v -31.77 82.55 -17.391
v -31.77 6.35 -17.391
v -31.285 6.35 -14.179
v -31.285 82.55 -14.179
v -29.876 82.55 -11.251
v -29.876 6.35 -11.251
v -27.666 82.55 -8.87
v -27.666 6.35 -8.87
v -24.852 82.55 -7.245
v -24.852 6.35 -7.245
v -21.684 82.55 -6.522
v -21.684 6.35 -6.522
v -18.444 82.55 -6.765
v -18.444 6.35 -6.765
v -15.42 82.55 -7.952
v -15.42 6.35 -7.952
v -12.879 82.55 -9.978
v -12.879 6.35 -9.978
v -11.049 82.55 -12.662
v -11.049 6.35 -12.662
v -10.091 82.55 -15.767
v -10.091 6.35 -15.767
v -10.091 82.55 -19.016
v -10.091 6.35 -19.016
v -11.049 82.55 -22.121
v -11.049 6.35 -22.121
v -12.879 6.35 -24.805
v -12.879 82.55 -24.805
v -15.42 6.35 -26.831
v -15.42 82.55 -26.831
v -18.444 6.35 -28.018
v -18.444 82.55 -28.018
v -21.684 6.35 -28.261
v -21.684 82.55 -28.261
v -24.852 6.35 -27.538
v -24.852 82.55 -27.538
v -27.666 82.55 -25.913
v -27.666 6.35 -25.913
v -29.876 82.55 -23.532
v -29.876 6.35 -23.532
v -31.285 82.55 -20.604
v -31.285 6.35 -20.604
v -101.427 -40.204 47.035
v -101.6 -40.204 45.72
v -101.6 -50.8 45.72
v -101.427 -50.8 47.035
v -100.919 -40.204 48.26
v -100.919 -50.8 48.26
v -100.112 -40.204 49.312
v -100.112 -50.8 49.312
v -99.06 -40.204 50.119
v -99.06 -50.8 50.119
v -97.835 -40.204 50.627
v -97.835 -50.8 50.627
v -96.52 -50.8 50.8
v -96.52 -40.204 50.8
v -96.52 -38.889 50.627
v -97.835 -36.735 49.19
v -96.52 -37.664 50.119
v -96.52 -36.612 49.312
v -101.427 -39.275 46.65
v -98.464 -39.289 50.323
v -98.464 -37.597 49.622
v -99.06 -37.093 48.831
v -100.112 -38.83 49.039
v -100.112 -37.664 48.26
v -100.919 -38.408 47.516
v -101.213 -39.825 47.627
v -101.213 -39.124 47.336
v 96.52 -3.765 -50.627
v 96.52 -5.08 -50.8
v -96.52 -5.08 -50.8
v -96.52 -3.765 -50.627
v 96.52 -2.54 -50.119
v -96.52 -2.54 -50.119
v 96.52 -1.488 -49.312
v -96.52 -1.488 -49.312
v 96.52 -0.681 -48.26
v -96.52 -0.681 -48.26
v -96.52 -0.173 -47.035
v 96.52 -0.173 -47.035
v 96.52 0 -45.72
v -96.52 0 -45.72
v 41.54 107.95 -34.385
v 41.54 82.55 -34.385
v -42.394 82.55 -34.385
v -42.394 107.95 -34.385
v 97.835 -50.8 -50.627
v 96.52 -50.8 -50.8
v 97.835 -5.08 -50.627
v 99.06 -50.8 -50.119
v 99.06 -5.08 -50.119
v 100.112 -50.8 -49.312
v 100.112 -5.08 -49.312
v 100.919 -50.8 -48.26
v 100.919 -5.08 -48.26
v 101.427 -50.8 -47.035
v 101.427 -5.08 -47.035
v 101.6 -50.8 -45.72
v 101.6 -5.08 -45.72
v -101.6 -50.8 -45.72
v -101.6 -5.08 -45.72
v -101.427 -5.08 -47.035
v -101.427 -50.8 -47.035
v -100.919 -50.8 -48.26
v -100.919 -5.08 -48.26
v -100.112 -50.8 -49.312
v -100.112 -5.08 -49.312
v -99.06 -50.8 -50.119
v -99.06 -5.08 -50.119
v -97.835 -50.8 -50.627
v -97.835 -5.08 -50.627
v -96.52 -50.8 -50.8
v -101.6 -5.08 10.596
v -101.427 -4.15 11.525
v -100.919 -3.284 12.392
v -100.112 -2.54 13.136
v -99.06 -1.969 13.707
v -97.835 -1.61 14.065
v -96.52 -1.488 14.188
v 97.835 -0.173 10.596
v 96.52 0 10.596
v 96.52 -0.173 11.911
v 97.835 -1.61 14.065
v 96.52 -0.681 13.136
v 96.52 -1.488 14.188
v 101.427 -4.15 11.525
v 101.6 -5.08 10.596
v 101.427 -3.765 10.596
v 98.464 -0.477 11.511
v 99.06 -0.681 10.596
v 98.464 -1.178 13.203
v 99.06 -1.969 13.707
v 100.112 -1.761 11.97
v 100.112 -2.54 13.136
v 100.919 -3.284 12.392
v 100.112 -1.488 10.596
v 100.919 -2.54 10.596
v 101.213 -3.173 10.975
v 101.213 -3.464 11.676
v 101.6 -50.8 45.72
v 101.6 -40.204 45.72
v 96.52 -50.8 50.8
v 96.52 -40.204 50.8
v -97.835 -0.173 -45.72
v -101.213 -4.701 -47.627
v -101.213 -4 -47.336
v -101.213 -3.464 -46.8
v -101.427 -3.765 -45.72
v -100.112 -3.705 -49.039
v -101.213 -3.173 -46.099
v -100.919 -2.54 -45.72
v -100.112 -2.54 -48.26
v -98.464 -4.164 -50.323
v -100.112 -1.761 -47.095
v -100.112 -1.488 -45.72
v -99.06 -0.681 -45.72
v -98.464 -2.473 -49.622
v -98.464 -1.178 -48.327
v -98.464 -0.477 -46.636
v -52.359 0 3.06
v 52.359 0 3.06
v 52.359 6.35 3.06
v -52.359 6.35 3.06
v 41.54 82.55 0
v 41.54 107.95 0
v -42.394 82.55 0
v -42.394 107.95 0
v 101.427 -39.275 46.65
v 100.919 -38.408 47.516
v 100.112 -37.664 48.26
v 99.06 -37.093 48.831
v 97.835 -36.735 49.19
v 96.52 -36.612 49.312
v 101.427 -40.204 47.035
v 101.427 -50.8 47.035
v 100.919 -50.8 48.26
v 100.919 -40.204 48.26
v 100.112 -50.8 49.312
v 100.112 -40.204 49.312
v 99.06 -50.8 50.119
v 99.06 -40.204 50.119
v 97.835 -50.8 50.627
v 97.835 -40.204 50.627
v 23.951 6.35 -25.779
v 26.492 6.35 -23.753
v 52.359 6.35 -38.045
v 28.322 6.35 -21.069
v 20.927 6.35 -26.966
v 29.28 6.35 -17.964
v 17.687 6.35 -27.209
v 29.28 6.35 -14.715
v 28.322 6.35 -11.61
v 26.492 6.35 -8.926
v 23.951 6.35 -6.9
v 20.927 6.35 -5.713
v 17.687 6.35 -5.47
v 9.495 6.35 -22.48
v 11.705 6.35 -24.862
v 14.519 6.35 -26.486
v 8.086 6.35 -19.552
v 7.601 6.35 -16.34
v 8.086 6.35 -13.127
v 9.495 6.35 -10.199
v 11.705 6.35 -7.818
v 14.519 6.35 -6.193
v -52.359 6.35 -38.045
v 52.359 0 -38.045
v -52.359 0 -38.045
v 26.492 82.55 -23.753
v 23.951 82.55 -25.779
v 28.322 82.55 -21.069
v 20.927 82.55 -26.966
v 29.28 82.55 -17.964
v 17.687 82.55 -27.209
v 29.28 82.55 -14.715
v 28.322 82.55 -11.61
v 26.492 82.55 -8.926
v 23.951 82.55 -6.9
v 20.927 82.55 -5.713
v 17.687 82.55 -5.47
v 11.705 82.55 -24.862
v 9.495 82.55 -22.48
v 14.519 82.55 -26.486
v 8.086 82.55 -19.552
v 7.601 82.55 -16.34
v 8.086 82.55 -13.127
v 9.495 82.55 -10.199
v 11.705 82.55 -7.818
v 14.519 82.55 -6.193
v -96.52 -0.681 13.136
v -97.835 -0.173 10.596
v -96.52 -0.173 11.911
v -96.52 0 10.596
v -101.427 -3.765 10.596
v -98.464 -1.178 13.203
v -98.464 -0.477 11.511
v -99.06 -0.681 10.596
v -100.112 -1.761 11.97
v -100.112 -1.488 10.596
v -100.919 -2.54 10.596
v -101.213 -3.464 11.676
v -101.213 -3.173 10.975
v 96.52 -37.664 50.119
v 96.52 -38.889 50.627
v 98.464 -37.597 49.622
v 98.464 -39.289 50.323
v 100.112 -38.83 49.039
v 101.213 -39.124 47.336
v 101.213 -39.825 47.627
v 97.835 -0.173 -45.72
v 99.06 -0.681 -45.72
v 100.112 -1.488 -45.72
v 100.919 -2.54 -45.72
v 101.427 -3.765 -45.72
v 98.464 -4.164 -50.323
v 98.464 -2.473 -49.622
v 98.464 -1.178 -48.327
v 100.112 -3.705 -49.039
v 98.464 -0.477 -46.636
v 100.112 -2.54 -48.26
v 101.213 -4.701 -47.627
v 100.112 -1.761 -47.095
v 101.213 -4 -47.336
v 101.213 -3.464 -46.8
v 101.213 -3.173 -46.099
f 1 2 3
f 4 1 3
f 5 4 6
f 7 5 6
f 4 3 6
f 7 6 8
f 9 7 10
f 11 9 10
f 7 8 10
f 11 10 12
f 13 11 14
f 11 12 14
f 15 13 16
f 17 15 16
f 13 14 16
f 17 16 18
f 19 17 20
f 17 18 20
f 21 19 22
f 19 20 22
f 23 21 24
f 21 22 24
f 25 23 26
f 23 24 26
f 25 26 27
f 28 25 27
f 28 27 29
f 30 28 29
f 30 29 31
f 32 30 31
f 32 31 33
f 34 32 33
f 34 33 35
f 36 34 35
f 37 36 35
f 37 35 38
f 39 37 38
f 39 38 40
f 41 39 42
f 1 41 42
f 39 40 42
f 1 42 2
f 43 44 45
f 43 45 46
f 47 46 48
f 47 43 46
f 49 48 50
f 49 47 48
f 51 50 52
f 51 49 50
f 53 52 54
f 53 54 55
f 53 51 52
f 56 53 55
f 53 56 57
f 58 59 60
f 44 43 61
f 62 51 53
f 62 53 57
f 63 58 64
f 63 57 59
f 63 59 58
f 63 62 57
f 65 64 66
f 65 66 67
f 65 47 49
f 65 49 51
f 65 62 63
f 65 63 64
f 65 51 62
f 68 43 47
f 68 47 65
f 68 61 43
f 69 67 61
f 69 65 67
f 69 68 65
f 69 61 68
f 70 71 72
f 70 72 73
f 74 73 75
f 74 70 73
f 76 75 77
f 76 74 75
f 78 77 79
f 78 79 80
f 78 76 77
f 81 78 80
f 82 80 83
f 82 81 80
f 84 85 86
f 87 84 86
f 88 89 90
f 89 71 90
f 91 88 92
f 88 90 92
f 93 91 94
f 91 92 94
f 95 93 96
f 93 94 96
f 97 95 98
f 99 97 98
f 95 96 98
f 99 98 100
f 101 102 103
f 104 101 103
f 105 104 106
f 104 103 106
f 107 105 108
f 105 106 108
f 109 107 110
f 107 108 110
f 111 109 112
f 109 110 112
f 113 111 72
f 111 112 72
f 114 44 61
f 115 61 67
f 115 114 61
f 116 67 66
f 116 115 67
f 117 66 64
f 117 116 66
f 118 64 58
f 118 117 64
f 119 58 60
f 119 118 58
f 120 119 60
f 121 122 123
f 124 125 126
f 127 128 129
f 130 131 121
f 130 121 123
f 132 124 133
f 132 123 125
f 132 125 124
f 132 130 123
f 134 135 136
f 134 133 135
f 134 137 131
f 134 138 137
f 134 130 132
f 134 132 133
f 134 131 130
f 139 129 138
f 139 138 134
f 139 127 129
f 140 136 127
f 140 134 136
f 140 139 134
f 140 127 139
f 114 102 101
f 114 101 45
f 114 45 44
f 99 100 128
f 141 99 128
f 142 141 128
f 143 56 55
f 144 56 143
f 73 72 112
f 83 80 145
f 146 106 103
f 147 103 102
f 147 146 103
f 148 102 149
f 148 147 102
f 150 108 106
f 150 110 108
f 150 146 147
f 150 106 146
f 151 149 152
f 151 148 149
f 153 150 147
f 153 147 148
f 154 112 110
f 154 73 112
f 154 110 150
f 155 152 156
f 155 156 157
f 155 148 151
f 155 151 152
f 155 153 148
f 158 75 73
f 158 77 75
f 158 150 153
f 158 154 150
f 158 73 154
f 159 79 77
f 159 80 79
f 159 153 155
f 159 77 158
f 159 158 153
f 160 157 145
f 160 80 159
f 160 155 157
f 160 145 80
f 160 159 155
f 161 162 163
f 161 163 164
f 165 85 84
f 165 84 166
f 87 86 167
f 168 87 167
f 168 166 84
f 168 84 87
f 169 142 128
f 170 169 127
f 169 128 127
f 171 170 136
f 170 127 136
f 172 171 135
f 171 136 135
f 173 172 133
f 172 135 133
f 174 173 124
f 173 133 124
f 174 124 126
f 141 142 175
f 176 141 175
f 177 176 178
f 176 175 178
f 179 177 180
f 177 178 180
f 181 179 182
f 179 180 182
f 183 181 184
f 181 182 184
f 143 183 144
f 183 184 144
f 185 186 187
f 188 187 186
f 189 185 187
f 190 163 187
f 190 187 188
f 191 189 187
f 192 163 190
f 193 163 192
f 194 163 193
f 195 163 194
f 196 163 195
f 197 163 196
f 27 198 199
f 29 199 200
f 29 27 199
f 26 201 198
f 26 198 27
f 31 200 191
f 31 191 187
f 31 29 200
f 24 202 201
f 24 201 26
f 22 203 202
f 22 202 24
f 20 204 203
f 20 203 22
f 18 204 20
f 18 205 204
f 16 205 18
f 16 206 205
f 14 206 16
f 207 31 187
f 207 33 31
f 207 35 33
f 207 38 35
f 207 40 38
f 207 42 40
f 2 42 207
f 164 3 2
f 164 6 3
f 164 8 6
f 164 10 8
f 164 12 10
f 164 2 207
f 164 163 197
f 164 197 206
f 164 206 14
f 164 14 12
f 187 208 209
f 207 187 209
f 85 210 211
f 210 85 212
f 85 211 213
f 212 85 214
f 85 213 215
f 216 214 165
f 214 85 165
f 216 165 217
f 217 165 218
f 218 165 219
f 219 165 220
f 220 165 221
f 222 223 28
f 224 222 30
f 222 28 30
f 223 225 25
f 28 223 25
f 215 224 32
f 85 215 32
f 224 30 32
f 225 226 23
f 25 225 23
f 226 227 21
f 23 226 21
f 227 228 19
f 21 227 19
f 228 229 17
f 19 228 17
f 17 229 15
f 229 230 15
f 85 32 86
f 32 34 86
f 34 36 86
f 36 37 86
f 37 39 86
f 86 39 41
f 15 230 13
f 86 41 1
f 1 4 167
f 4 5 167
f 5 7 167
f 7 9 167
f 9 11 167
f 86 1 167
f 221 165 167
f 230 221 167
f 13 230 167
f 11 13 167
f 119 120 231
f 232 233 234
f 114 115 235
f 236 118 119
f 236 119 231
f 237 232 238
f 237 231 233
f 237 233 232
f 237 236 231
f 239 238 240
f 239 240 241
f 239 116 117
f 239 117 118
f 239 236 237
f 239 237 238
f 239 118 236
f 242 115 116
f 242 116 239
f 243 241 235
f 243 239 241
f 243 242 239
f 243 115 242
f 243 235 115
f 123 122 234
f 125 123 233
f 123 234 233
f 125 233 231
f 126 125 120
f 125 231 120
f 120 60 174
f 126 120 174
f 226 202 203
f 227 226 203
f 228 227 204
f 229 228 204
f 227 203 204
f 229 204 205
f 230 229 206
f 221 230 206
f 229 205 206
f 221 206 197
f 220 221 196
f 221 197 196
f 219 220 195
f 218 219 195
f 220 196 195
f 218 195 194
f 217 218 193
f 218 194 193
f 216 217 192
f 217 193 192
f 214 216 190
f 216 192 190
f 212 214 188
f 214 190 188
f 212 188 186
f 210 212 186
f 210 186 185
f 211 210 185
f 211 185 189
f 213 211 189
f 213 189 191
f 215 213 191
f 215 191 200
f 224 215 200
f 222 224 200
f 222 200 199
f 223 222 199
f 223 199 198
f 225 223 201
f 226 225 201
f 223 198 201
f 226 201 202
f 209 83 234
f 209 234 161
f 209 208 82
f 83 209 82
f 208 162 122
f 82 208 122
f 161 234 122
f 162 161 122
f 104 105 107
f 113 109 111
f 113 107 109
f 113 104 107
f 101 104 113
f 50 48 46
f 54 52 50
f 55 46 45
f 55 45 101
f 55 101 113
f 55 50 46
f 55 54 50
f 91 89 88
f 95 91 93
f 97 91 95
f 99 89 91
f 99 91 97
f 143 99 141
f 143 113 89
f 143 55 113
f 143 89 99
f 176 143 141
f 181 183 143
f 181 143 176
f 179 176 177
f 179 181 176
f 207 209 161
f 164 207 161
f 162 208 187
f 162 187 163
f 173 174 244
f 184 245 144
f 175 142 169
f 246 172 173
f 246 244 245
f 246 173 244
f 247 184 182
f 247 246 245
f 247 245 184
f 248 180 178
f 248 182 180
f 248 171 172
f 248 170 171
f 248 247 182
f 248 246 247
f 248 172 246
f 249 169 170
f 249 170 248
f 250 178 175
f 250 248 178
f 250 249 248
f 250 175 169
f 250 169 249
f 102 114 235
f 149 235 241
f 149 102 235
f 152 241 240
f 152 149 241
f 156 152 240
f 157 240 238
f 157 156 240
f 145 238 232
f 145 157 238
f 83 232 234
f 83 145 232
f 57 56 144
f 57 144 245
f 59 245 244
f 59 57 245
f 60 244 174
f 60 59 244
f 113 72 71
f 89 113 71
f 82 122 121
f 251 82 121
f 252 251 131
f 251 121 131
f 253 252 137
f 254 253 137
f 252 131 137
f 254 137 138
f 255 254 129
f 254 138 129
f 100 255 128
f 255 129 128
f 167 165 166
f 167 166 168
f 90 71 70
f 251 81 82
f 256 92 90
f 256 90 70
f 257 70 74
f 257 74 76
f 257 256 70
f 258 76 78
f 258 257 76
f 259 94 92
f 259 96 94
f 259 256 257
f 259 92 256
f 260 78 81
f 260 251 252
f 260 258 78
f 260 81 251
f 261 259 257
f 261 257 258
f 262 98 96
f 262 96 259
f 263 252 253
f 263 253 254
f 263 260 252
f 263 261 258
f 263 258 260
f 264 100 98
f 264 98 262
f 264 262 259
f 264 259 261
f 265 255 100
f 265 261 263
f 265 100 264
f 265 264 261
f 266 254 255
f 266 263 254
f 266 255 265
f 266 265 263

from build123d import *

# Parameters (mm, degrees)
F0_W         = 203.2
F0_H         = 101.6
F1_DEPTH     = 50.8
F2_R         = 5.08
F3_SIZE      = 38.1
F4_T1_DEPTH  = 71.12
F4_T3_DEPTH  = 58.42
F4_T6_ANGLE  = 90
F5_R         = 5.08
F6_T1_DEPTH  = 64.4773318296
F6_T3_DEPTH  = 193.04
F6_T8_DEPTH  = 5.08
F6_T14_DEPTH = 5.08
F7_T1_DEPTH  = 193.04
F7_T3_DEPTH  = 23.2957951031
F7_T8_DEPTH  = 5.08
F7_T14_DEPTH = 5.08
F8_W         = 104.7176718712
F8_H         = 41.105248034
F9_DEPTH     = 6.35
F10_R        = 10.900008085
F11_DEPTH    = 76.2
F12_W        = 83.9344151318
F12_H        = 34.3853458762
F13_DEPTH    = 25.4


# Not quite as in the source:
# - a fillet or chamfer that OpenCascade refuses, or shapes differently, is made with other operations: its cross-section is extruded or revolved along the edge and cut away or added


with BuildPart() as f1:
    # F0 (on Front) → F1 (new body)
    with BuildSketch(Plane.XZ):
        Rectangle(F0_W, F0_H)
    extrude(amount=F1_DEPTH)

    # F2
    f2_edges = [f1.edges().sort_by_distance(p)[0] for p in [
        (0, 0, -50.8),
    ]]
    fillet(f2_edges, radius=F2_R)

    # F3
    f3_edges = [f1.edges().sort_by_distance(p)[0] for p in [
        (0, 0, 50.8),
    ]]
    chamfer(f3_edges, length=F3_SIZE)

    # F4: fillet of radius 5.08 on 1 edges, made by hand

    # F4_s2 → F4_t1 (cut)
    with BuildSketch(Plane.XY.offset(-45.72)):
        with BuildLine():
            ThreePointArc((-101.6, -5.08), (-100.1121024484, -1.4878975516), (-96.52, 0))
            Line((-96.52, 0), (-101.6, 0))
            Line((-101.6, 0), (-101.6, -5.08))
        make_face()
    extrude(amount=F4_T1_DEPTH, mode=Mode.SUBTRACT)

    # F4_s4 → F4_t3 (cut)
    with BuildSketch(Plane.XZ.offset(5.08)):
        with BuildLine():
            ThreePointArc((-101.6, -45.72), (-100.1121024484, -49.3121024484), (-96.52, -50.8))
            Line((-96.52, -50.8), (-101.6, -50.8))
            Line((-101.6, -50.8), (-101.6, -45.72))
        make_face()
    extrude(amount=F4_T3_DEPTH, mode=Mode.SUBTRACT)

    # F4_s5 → F4_t6 (revolve, cut)
    with BuildSketch(Plane.XZ.offset(5.08)):
        with BuildLine():
            ThreePointArc((-101.6, -45.72), (-100.1121024484, -49.3121024484), (-96.52, -50.8))
            Line((-96.52, -50.8), (-101.6, -50.8))
            Line((-101.6, -50.8), (-101.6, -45.72))
        make_face()
    revolve(axis=Axis((-101.6, -5.08, -45.72), (1, 0, 0)), revolution_arc=F4_T6_ANGLE, mode=Mode.SUBTRACT)

    # F5
    f5_edges = [f1.edges().sort_by_distance(p)[0] for p in [
        (101.6, 0, -16.51),
    ]]
    fillet(f5_edges, radius=F5_R)

    # F6: fillet of radius 5.08 on 1 edges, made by hand

    # F6_s2 → F6_t1 (cut)
    with BuildSketch(Plane(origin=(0, -7.8378975516, 7.8378975516), x_dir=(1, 0, 0), z_dir=(0, -0.7071067812, 0.7071067812))):
        with BuildLine():
            ThreePointArc((101.6, 3.9002561211), (100.1121024484, 7.4923585695), (96.52, 8.9802561211))
            Line((96.52, 8.9802561211), (101.6, 8.9802561211))
            Line((101.6, 8.9802561211), (101.6, 3.9002561211))
        make_face()
        with BuildLine():
            ThreePointArc((-101.6, 3.9002561211), (-100.1121024484, 7.4923585695), (-96.52, 8.9802561211))
            Line((-96.52, 8.9802561211), (-101.6, 8.9802561211))
            Line((-101.6, 8.9802561211), (-101.6, 3.9002561211))
        make_face()
    extrude(amount=F6_T1_DEPTH, mode=Mode.SUBTRACT)

    # F6_s4 → F6_t3 (cut)
    with BuildSketch(Plane.YZ.offset(-96.52)):
        with BuildLine():
            ThreePointArc((0, 10.5957951031), (-0.3866919748, 12.5398269396), (-1.4878975516, 14.1878975516))
            Line((-1.4878975516, 14.1878975516), (0, 12.7))
            Line((0, 12.7), (0, 10.5957951031))
        make_face()
    extrude(amount=F6_T3_DEPTH, mode=Mode.SUBTRACT)


with BuildPart() as f6_tool6:
    # F6_s7 → F6_t8 (new body)
    with BuildSketch(Plane.YZ.offset(96.52)):
        Polygon((-5.08, 10.5957951031), (-1.4878975516, 14.1878975516), (0, 12.7), (0, 10.5957951031), align=None)
    extrude(amount=F6_T8_DEPTH)

    # F6_s9 → F6_t10 (revolve, cut)
    with BuildSketch(Plane(origin=(96.52, -5.08, 10.5957951031), x_dir=(0, -0.9238795325, -0.3826834324), z_dir=(0, -0.3826834324, 0.9238795325))):
        with BuildLine():
            ThreePointArc((0, -5.08), (5.08, 0), (0, 5.08))
            Line((0, 5.08), (0, -5.08))
        make_face()
    revolve(axis=Axis((96.52, -5.08, 10.5957951031), (1, 0, 0)), mode=Mode.SUBTRACT)


with BuildPart() as f1_1:
    add(f1.part)

    # F6_t5: cut F6_tool6
    add(f6_tool6.part, mode=Mode.SUBTRACT)


with BuildPart() as f6_tool12:
    # F6_s13 → F6_t14 (new body)
    with BuildSketch(Plane.YZ.offset(-96.52)):
        Polygon((-5.08, 10.5957951031), (-1.4878975516, 14.1878975516), (0, 12.7), (0, 10.5957951031), align=None)
    extrude(amount=-F6_T14_DEPTH)

    # F6_s15 → F6_t16 (revolve, cut)
    with BuildSketch(Plane(origin=(-96.52, -5.08, 10.5957951031), x_dir=(0, -0.9238795325, -0.3826834324), z_dir=(0, 0.3826834324, -0.9238795325))):
        with BuildLine():
            ThreePointArc((0, -5.08), (5.08, 0), (0, 5.08))
            Line((0, 5.08), (0, -5.08))
        make_face()
    revolve(axis=Axis((-96.52, -5.08, 10.5957951031), (-1, 0, 0)), mode=Mode.SUBTRACT)


with BuildPart() as f1_2:
    add(f1_1.part)

    # F6_t11: cut F6_tool12
    add(f6_tool12.part, mode=Mode.SUBTRACT)

    # F7: fillet of radius 5.08 on 3 edges, made by hand

    # F7_s2 → F7_t1 (cut)
    with BuildSketch(Plane.YZ.offset(-96.52)):
        with BuildLine():
            ThreePointArc((-40.2042048969, 50.8), (-38.2601730604, 50.4133080252), (-36.6121024484, 49.3121024484))
            Line((-36.6121024484, 49.3121024484), (-38.1, 50.8))
            Line((-38.1, 50.8), (-40.2042048969, 50.8))
        make_face()
    extrude(amount=F7_T1_DEPTH, mode=Mode.SUBTRACT)

    # F7_s4 → F7_t3 (cut)
    with BuildSketch(Plane.XZ.offset(40.2042048969)):
        with BuildLine():
            ThreePointArc((101.6, 45.72), (100.1121024484, 49.3121024484), (96.52, 50.8))
            Line((96.52, 50.8), (101.6, 50.8))
            Line((101.6, 50.8), (101.6, 45.72))
        make_face()
        with BuildLine():
            ThreePointArc((-101.6, 45.72), (-100.1121024484, 49.3121024484), (-96.52, 50.8))
            Line((-96.52, 50.8), (-101.6, 50.8))
            Line((-101.6, 50.8), (-101.6, 45.72))
        make_face()
    extrude(amount=F7_T3_DEPTH, mode=Mode.SUBTRACT)


with BuildPart() as f7_tool6:
    # F7_s7 → F7_t8 (new body)
    with BuildSketch(Plane.YZ.offset(-96.52)):
        Polygon((-40.2042048969, 45.72), (-40.2042048969, 50.8), (-38.1, 50.8), (-36.6121024484, 49.3121024484), align=None)
    extrude(amount=-F7_T8_DEPTH)

    # F7_s9 → F7_t10 (revolve, cut)
    with BuildSketch(Plane(origin=(-96.52, -40.2042048969, 45.72), x_dir=(0, -0.3826834324, -0.9238795325), z_dir=(0, 0.9238795325, -0.3826834324))):
        with BuildLine():
            ThreePointArc((0, -5.08), (5.08, 0), (0, 5.08))
            Line((0, 5.08), (0, -5.08))
        make_face()
    revolve(axis=Axis((-96.52, -40.2042048969, 45.72), (-1, 0, 0)), mode=Mode.SUBTRACT)


with BuildPart() as f1_3:
    add(f1_2.part)

    # F7_t5: cut F7_tool6
    add(f7_tool6.part, mode=Mode.SUBTRACT)


with BuildPart() as f7_tool12:
    # F7_s13 → F7_t14 (new body)
    with BuildSketch(Plane.YZ.offset(96.52)):
        Polygon((-40.2042048969, 45.72), (-40.2042048969, 50.8), (-38.1, 50.8), (-36.6121024484, 49.3121024484), align=None)
    extrude(amount=F7_T14_DEPTH)

    # F7_s15 → F7_t16 (revolve, cut)
    with BuildSketch(Plane(origin=(96.52, -40.2042048969, 45.72), x_dir=(0, -0.3826834324, -0.9238795325), z_dir=(0, -0.9238795325, 0.3826834324))):
        with BuildLine():
            ThreePointArc((0, -5.08), (5.08, 0), (0, 5.08))
            Line((0, 5.08), (0, -5.08))
        make_face()
    revolve(axis=Axis((96.52, -40.2042048969, 45.72), (1, 0, 0)), mode=Mode.SUBTRACT)


with BuildPart() as f1_4:
    add(f1_3.part)

    # F7_t11: cut F7_tool12
    add(f7_tool12.part, mode=Mode.SUBTRACT)

    # F8 (on face) → F9 (join)
    with BuildSketch(Plane(origin=(0, 0, 0), x_dir=(-1, 0, 0), z_dir=(0, 1, 0))):
        with Locations((0, -17.4928158522)):
            Rectangle(F8_W, F8_H)
    extrude(amount=F9_DEPTH)

    # F10 (on face) → F11 (join)
    with BuildSketch(Plane(origin=(0, 6.35, 0), x_dir=(-1, 0, 0), z_dir=(0, 1, 0))):
        with Locations((-18.5013078153, -16.3395497948)):
            Circle(F10_R)
        with Locations((20.8696890622, -17.3914972693)):
            Circle(F10_R)
    extrude(amount=F11_DEPTH)

    # F12 (on face) → F13 (join)
    with BuildSketch(Plane(origin=(0, 82.55, 0), x_dir=(-1, 0, 0), z_dir=(0, 1, 0))):
        with Locations((0.4271473736, -17.1926729381)):
            Rectangle(F12_W, F12_H)
    extrude(amount=F13_DEPTH)


solid = f1_4.part
